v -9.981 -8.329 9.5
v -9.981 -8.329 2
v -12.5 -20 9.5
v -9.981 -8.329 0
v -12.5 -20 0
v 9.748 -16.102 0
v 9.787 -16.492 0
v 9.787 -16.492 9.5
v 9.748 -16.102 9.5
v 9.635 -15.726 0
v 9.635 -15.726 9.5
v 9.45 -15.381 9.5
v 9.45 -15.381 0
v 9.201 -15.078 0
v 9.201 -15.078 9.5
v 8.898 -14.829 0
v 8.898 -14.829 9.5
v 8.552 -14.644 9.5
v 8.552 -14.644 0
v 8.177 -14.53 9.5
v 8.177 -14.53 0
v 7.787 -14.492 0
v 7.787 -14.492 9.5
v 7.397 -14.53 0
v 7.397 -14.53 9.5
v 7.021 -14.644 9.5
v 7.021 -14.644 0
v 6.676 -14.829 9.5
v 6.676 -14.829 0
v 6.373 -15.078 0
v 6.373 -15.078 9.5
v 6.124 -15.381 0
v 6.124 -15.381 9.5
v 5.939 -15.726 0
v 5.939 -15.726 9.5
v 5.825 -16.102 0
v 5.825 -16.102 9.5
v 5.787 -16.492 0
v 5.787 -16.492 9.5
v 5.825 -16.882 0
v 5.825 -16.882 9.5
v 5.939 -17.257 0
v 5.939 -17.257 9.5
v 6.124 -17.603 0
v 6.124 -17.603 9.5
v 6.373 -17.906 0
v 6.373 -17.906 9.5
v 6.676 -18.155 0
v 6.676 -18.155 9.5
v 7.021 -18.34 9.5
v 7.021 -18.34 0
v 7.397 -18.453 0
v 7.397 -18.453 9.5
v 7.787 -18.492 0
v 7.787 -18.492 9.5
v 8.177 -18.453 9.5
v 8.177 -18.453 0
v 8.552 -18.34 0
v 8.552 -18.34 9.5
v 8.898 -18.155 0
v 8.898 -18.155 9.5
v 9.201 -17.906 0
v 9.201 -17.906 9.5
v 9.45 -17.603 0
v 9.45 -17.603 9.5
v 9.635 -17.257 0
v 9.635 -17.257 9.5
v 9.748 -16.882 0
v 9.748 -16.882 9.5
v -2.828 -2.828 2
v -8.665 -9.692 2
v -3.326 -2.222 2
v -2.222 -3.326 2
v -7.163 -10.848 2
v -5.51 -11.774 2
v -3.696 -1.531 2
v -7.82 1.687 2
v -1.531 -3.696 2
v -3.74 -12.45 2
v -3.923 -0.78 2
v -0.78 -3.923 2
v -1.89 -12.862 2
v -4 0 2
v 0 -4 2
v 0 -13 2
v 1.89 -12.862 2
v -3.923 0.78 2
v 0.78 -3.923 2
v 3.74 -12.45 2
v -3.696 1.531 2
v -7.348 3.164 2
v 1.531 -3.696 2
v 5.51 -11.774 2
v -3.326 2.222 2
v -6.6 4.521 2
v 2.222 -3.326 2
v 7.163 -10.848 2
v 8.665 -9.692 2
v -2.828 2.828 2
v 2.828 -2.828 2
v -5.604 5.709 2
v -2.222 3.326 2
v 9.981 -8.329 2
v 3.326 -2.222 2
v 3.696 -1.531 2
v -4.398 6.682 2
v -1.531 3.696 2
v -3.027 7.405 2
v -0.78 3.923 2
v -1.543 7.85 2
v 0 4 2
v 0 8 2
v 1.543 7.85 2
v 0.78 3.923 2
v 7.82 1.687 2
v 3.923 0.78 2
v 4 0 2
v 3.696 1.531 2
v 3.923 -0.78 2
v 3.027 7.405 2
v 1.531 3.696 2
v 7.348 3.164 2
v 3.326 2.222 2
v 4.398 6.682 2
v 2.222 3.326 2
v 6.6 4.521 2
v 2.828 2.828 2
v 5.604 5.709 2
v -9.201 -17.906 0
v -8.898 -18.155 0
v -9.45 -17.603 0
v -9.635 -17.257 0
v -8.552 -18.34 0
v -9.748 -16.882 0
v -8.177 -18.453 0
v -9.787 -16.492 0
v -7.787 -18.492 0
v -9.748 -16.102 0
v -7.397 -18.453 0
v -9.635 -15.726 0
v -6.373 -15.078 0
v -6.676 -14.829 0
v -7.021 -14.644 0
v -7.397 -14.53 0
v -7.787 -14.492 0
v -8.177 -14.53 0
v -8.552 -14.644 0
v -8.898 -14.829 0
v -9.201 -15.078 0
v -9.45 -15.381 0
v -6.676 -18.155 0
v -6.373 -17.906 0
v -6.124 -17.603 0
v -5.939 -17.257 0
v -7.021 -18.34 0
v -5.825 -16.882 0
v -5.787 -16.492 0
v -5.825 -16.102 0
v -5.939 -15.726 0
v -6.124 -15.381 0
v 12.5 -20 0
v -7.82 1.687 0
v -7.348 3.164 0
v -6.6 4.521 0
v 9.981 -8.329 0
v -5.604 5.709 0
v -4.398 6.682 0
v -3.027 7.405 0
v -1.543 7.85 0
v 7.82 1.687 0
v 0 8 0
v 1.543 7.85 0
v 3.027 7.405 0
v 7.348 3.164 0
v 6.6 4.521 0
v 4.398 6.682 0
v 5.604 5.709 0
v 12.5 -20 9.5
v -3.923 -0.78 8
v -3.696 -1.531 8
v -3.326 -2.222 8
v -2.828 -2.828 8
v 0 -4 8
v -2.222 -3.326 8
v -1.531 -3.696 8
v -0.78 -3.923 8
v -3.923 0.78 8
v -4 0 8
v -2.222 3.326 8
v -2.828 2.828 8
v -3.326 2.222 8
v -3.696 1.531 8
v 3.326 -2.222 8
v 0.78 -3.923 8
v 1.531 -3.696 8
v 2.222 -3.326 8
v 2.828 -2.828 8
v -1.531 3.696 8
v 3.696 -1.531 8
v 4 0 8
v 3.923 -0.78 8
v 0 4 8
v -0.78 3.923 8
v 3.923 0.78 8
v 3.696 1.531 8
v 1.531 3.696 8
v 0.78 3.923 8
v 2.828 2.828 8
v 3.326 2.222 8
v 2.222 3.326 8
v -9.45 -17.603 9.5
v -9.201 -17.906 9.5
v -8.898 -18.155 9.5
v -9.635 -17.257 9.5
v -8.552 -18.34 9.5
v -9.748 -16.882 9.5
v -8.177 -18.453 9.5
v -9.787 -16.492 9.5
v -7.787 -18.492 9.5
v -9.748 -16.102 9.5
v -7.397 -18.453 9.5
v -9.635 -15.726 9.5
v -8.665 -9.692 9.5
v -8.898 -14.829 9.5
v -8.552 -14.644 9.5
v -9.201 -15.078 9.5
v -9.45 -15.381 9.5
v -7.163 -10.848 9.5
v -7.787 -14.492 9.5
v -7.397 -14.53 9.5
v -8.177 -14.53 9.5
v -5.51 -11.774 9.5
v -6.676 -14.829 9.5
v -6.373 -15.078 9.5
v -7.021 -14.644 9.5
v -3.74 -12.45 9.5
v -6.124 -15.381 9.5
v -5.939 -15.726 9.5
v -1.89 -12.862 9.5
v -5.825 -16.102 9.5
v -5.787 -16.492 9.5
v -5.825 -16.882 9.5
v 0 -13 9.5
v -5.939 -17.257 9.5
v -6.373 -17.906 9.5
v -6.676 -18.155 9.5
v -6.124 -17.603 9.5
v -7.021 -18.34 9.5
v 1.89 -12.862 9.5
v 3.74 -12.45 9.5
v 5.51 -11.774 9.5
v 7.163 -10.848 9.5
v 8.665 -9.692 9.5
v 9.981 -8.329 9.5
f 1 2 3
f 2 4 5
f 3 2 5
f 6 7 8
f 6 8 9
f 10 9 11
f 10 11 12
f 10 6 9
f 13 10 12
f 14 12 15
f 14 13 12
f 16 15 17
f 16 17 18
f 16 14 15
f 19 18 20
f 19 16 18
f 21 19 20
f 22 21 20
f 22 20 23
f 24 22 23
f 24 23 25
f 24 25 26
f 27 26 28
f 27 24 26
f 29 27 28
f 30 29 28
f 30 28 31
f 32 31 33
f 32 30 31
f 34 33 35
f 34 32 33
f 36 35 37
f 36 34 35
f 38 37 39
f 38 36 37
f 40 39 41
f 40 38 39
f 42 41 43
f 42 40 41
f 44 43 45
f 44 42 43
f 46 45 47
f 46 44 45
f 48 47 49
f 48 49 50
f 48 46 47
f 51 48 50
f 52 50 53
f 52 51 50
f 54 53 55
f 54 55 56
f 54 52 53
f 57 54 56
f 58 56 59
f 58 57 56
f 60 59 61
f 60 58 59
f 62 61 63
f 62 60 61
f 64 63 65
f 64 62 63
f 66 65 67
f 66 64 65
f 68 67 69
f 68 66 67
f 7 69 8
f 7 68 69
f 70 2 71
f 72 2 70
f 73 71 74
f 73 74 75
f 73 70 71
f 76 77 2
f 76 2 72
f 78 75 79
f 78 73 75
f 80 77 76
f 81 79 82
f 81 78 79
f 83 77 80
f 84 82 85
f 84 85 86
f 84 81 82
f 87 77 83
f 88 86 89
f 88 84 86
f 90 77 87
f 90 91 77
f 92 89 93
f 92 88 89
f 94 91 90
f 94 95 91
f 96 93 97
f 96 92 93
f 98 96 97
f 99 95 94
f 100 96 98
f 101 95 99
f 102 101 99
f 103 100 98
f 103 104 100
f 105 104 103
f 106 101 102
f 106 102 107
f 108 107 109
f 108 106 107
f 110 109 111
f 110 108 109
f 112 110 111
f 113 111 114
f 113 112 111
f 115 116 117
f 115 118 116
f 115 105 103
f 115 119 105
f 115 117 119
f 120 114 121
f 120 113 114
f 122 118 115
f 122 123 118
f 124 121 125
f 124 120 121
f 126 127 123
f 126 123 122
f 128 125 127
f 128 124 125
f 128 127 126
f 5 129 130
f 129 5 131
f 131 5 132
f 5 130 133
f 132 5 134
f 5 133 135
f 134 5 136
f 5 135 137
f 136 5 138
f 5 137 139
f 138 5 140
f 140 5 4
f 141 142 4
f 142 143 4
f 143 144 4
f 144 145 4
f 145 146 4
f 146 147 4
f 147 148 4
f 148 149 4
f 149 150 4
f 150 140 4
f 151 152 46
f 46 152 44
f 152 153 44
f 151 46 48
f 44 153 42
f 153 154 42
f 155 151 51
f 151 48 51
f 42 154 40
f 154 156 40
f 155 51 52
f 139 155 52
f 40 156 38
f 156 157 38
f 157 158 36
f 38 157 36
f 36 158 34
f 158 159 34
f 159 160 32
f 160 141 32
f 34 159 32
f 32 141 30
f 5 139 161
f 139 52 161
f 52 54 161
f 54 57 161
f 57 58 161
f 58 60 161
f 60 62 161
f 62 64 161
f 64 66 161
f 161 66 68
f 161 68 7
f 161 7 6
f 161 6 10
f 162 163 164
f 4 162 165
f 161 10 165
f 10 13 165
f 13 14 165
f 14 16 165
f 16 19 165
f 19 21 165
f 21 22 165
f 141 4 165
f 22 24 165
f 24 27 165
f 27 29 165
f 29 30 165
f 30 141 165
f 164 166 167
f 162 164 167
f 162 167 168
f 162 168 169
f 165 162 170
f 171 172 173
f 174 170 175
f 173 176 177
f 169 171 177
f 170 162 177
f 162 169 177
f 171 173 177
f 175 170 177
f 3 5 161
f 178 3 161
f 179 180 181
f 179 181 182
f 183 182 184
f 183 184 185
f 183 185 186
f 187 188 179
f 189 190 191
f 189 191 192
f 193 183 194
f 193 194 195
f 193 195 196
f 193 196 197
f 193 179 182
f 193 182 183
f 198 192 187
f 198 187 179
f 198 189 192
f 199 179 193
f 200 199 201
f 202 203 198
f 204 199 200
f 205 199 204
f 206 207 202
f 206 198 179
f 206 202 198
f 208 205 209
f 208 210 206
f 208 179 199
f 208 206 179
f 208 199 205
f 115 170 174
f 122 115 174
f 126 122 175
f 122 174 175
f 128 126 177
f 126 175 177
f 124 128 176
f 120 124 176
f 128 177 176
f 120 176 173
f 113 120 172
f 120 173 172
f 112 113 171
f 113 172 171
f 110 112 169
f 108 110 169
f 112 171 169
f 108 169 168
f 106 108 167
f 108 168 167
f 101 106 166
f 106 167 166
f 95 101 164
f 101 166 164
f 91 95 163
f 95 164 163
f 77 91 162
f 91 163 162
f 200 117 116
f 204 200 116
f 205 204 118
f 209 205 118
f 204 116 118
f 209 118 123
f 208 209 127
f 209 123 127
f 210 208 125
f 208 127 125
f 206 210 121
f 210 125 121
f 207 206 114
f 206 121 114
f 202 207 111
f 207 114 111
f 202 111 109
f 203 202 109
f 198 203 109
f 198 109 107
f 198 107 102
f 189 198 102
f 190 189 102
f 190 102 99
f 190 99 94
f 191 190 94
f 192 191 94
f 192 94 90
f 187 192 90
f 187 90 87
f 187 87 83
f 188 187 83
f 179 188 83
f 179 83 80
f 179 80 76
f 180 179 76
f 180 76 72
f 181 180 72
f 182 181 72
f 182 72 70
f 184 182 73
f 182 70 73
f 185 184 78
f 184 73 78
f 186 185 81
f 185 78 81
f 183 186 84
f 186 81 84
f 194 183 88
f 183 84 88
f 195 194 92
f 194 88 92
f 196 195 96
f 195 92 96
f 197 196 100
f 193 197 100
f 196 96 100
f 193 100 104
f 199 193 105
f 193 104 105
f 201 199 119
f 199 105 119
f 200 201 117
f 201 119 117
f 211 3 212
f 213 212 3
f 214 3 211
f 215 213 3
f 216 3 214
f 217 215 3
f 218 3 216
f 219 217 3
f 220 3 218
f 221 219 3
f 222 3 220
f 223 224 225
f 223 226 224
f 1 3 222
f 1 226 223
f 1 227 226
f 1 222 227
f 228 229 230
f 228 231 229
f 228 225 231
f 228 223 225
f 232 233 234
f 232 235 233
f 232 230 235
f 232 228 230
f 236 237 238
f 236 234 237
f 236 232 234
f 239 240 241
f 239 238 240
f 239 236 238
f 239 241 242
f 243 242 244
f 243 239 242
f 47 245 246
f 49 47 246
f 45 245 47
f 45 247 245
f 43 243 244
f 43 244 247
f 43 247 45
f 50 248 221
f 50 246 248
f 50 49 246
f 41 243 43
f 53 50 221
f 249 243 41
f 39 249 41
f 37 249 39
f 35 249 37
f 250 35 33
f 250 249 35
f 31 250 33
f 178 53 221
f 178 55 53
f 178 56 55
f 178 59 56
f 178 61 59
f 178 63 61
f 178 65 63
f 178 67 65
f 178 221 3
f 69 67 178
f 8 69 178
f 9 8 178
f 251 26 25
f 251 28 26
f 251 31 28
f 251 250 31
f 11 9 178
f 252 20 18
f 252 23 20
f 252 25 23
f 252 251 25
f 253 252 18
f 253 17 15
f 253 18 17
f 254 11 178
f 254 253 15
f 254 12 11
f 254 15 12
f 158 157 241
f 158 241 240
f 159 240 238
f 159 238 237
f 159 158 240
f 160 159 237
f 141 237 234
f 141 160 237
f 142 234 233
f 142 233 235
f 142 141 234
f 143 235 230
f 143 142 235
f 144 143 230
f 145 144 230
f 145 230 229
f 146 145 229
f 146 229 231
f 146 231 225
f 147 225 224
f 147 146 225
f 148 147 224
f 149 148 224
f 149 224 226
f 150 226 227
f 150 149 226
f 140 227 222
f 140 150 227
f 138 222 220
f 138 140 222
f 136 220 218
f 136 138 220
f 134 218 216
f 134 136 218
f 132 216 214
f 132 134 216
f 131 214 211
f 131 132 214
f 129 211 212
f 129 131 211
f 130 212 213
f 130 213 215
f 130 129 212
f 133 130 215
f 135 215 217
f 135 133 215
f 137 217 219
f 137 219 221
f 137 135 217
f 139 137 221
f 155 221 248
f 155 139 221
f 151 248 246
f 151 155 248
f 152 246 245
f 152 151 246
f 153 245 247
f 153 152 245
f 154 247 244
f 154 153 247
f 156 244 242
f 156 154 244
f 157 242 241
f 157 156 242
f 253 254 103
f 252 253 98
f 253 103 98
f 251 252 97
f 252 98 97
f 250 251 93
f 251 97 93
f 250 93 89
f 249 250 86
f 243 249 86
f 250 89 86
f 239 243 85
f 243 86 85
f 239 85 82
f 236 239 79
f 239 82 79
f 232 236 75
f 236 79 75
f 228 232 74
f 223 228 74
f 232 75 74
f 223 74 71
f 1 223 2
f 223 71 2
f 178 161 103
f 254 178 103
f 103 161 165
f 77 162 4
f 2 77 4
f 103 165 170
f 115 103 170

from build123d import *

# Parameters (mm, degrees)
F0_R     = 2
F1_DEPTH = 9.5
F0_R_2   = 4
F2_DEPTH = 8
F3_DEPTH = 2


with BuildPart() as f1:
    # F0 (on Top) → F1 (new body)
    with BuildSketch(Plane.XY):
        with BuildLine():
            Line((12.5, -20), (9.981460471, -8.3288922952))
            ThreePointArc((9.981460471, -8.3288922952), (0, -13), (-9.981460471, -8.3288922952))
            Line((-9.981460471, -8.3288922952), (-12.5, -20))
            Line((-12.5, -20), (0, -20))
            Line((0, -20), (12.5, -20))
        make_face()
        with Locations((-7.7868145891, -16.4918396622)):
            Circle(F0_R, mode=Mode.SUBTRACT)
        with Locations((7.7868145891, -16.4918396622)):
            Circle(F0_R, mode=Mode.SUBTRACT)
    extrude(amount=F1_DEPTH)



with BuildPart() as f2:
    # F0 (on Top) → F2 (new body)
    with BuildSketch(Plane.XY):
        Circle(F0_R_2)
    extrude(amount=F2_DEPTH)


with BuildPart() as f1_1:
    add(f1.part)

    add(f2.part)  # F3 merges F2
    # F0 (on Top) → F3 (join)
    with BuildSketch(Plane.XY):
        with BuildLine():
            Line((9.981460471, -8.3288922952), (7.8199968309, 1.6874980193))
            ThreePointArc((7.8199968309, 1.6874980193), (0, 8), (-7.8199968309, 1.6874980193))
            Line((-7.8199968309, 1.6874980193), (-9.981460471, -8.3288922952))
            ThreePointArc((-9.981460471, -8.3288922952), (0, -13), (9.981460471, -8.3288922952))
        make_face()
        Circle(F0_R_2, mode=Mode.SUBTRACT)
    extrude(amount=F3_DEPTH)


solid = f1_1.part
